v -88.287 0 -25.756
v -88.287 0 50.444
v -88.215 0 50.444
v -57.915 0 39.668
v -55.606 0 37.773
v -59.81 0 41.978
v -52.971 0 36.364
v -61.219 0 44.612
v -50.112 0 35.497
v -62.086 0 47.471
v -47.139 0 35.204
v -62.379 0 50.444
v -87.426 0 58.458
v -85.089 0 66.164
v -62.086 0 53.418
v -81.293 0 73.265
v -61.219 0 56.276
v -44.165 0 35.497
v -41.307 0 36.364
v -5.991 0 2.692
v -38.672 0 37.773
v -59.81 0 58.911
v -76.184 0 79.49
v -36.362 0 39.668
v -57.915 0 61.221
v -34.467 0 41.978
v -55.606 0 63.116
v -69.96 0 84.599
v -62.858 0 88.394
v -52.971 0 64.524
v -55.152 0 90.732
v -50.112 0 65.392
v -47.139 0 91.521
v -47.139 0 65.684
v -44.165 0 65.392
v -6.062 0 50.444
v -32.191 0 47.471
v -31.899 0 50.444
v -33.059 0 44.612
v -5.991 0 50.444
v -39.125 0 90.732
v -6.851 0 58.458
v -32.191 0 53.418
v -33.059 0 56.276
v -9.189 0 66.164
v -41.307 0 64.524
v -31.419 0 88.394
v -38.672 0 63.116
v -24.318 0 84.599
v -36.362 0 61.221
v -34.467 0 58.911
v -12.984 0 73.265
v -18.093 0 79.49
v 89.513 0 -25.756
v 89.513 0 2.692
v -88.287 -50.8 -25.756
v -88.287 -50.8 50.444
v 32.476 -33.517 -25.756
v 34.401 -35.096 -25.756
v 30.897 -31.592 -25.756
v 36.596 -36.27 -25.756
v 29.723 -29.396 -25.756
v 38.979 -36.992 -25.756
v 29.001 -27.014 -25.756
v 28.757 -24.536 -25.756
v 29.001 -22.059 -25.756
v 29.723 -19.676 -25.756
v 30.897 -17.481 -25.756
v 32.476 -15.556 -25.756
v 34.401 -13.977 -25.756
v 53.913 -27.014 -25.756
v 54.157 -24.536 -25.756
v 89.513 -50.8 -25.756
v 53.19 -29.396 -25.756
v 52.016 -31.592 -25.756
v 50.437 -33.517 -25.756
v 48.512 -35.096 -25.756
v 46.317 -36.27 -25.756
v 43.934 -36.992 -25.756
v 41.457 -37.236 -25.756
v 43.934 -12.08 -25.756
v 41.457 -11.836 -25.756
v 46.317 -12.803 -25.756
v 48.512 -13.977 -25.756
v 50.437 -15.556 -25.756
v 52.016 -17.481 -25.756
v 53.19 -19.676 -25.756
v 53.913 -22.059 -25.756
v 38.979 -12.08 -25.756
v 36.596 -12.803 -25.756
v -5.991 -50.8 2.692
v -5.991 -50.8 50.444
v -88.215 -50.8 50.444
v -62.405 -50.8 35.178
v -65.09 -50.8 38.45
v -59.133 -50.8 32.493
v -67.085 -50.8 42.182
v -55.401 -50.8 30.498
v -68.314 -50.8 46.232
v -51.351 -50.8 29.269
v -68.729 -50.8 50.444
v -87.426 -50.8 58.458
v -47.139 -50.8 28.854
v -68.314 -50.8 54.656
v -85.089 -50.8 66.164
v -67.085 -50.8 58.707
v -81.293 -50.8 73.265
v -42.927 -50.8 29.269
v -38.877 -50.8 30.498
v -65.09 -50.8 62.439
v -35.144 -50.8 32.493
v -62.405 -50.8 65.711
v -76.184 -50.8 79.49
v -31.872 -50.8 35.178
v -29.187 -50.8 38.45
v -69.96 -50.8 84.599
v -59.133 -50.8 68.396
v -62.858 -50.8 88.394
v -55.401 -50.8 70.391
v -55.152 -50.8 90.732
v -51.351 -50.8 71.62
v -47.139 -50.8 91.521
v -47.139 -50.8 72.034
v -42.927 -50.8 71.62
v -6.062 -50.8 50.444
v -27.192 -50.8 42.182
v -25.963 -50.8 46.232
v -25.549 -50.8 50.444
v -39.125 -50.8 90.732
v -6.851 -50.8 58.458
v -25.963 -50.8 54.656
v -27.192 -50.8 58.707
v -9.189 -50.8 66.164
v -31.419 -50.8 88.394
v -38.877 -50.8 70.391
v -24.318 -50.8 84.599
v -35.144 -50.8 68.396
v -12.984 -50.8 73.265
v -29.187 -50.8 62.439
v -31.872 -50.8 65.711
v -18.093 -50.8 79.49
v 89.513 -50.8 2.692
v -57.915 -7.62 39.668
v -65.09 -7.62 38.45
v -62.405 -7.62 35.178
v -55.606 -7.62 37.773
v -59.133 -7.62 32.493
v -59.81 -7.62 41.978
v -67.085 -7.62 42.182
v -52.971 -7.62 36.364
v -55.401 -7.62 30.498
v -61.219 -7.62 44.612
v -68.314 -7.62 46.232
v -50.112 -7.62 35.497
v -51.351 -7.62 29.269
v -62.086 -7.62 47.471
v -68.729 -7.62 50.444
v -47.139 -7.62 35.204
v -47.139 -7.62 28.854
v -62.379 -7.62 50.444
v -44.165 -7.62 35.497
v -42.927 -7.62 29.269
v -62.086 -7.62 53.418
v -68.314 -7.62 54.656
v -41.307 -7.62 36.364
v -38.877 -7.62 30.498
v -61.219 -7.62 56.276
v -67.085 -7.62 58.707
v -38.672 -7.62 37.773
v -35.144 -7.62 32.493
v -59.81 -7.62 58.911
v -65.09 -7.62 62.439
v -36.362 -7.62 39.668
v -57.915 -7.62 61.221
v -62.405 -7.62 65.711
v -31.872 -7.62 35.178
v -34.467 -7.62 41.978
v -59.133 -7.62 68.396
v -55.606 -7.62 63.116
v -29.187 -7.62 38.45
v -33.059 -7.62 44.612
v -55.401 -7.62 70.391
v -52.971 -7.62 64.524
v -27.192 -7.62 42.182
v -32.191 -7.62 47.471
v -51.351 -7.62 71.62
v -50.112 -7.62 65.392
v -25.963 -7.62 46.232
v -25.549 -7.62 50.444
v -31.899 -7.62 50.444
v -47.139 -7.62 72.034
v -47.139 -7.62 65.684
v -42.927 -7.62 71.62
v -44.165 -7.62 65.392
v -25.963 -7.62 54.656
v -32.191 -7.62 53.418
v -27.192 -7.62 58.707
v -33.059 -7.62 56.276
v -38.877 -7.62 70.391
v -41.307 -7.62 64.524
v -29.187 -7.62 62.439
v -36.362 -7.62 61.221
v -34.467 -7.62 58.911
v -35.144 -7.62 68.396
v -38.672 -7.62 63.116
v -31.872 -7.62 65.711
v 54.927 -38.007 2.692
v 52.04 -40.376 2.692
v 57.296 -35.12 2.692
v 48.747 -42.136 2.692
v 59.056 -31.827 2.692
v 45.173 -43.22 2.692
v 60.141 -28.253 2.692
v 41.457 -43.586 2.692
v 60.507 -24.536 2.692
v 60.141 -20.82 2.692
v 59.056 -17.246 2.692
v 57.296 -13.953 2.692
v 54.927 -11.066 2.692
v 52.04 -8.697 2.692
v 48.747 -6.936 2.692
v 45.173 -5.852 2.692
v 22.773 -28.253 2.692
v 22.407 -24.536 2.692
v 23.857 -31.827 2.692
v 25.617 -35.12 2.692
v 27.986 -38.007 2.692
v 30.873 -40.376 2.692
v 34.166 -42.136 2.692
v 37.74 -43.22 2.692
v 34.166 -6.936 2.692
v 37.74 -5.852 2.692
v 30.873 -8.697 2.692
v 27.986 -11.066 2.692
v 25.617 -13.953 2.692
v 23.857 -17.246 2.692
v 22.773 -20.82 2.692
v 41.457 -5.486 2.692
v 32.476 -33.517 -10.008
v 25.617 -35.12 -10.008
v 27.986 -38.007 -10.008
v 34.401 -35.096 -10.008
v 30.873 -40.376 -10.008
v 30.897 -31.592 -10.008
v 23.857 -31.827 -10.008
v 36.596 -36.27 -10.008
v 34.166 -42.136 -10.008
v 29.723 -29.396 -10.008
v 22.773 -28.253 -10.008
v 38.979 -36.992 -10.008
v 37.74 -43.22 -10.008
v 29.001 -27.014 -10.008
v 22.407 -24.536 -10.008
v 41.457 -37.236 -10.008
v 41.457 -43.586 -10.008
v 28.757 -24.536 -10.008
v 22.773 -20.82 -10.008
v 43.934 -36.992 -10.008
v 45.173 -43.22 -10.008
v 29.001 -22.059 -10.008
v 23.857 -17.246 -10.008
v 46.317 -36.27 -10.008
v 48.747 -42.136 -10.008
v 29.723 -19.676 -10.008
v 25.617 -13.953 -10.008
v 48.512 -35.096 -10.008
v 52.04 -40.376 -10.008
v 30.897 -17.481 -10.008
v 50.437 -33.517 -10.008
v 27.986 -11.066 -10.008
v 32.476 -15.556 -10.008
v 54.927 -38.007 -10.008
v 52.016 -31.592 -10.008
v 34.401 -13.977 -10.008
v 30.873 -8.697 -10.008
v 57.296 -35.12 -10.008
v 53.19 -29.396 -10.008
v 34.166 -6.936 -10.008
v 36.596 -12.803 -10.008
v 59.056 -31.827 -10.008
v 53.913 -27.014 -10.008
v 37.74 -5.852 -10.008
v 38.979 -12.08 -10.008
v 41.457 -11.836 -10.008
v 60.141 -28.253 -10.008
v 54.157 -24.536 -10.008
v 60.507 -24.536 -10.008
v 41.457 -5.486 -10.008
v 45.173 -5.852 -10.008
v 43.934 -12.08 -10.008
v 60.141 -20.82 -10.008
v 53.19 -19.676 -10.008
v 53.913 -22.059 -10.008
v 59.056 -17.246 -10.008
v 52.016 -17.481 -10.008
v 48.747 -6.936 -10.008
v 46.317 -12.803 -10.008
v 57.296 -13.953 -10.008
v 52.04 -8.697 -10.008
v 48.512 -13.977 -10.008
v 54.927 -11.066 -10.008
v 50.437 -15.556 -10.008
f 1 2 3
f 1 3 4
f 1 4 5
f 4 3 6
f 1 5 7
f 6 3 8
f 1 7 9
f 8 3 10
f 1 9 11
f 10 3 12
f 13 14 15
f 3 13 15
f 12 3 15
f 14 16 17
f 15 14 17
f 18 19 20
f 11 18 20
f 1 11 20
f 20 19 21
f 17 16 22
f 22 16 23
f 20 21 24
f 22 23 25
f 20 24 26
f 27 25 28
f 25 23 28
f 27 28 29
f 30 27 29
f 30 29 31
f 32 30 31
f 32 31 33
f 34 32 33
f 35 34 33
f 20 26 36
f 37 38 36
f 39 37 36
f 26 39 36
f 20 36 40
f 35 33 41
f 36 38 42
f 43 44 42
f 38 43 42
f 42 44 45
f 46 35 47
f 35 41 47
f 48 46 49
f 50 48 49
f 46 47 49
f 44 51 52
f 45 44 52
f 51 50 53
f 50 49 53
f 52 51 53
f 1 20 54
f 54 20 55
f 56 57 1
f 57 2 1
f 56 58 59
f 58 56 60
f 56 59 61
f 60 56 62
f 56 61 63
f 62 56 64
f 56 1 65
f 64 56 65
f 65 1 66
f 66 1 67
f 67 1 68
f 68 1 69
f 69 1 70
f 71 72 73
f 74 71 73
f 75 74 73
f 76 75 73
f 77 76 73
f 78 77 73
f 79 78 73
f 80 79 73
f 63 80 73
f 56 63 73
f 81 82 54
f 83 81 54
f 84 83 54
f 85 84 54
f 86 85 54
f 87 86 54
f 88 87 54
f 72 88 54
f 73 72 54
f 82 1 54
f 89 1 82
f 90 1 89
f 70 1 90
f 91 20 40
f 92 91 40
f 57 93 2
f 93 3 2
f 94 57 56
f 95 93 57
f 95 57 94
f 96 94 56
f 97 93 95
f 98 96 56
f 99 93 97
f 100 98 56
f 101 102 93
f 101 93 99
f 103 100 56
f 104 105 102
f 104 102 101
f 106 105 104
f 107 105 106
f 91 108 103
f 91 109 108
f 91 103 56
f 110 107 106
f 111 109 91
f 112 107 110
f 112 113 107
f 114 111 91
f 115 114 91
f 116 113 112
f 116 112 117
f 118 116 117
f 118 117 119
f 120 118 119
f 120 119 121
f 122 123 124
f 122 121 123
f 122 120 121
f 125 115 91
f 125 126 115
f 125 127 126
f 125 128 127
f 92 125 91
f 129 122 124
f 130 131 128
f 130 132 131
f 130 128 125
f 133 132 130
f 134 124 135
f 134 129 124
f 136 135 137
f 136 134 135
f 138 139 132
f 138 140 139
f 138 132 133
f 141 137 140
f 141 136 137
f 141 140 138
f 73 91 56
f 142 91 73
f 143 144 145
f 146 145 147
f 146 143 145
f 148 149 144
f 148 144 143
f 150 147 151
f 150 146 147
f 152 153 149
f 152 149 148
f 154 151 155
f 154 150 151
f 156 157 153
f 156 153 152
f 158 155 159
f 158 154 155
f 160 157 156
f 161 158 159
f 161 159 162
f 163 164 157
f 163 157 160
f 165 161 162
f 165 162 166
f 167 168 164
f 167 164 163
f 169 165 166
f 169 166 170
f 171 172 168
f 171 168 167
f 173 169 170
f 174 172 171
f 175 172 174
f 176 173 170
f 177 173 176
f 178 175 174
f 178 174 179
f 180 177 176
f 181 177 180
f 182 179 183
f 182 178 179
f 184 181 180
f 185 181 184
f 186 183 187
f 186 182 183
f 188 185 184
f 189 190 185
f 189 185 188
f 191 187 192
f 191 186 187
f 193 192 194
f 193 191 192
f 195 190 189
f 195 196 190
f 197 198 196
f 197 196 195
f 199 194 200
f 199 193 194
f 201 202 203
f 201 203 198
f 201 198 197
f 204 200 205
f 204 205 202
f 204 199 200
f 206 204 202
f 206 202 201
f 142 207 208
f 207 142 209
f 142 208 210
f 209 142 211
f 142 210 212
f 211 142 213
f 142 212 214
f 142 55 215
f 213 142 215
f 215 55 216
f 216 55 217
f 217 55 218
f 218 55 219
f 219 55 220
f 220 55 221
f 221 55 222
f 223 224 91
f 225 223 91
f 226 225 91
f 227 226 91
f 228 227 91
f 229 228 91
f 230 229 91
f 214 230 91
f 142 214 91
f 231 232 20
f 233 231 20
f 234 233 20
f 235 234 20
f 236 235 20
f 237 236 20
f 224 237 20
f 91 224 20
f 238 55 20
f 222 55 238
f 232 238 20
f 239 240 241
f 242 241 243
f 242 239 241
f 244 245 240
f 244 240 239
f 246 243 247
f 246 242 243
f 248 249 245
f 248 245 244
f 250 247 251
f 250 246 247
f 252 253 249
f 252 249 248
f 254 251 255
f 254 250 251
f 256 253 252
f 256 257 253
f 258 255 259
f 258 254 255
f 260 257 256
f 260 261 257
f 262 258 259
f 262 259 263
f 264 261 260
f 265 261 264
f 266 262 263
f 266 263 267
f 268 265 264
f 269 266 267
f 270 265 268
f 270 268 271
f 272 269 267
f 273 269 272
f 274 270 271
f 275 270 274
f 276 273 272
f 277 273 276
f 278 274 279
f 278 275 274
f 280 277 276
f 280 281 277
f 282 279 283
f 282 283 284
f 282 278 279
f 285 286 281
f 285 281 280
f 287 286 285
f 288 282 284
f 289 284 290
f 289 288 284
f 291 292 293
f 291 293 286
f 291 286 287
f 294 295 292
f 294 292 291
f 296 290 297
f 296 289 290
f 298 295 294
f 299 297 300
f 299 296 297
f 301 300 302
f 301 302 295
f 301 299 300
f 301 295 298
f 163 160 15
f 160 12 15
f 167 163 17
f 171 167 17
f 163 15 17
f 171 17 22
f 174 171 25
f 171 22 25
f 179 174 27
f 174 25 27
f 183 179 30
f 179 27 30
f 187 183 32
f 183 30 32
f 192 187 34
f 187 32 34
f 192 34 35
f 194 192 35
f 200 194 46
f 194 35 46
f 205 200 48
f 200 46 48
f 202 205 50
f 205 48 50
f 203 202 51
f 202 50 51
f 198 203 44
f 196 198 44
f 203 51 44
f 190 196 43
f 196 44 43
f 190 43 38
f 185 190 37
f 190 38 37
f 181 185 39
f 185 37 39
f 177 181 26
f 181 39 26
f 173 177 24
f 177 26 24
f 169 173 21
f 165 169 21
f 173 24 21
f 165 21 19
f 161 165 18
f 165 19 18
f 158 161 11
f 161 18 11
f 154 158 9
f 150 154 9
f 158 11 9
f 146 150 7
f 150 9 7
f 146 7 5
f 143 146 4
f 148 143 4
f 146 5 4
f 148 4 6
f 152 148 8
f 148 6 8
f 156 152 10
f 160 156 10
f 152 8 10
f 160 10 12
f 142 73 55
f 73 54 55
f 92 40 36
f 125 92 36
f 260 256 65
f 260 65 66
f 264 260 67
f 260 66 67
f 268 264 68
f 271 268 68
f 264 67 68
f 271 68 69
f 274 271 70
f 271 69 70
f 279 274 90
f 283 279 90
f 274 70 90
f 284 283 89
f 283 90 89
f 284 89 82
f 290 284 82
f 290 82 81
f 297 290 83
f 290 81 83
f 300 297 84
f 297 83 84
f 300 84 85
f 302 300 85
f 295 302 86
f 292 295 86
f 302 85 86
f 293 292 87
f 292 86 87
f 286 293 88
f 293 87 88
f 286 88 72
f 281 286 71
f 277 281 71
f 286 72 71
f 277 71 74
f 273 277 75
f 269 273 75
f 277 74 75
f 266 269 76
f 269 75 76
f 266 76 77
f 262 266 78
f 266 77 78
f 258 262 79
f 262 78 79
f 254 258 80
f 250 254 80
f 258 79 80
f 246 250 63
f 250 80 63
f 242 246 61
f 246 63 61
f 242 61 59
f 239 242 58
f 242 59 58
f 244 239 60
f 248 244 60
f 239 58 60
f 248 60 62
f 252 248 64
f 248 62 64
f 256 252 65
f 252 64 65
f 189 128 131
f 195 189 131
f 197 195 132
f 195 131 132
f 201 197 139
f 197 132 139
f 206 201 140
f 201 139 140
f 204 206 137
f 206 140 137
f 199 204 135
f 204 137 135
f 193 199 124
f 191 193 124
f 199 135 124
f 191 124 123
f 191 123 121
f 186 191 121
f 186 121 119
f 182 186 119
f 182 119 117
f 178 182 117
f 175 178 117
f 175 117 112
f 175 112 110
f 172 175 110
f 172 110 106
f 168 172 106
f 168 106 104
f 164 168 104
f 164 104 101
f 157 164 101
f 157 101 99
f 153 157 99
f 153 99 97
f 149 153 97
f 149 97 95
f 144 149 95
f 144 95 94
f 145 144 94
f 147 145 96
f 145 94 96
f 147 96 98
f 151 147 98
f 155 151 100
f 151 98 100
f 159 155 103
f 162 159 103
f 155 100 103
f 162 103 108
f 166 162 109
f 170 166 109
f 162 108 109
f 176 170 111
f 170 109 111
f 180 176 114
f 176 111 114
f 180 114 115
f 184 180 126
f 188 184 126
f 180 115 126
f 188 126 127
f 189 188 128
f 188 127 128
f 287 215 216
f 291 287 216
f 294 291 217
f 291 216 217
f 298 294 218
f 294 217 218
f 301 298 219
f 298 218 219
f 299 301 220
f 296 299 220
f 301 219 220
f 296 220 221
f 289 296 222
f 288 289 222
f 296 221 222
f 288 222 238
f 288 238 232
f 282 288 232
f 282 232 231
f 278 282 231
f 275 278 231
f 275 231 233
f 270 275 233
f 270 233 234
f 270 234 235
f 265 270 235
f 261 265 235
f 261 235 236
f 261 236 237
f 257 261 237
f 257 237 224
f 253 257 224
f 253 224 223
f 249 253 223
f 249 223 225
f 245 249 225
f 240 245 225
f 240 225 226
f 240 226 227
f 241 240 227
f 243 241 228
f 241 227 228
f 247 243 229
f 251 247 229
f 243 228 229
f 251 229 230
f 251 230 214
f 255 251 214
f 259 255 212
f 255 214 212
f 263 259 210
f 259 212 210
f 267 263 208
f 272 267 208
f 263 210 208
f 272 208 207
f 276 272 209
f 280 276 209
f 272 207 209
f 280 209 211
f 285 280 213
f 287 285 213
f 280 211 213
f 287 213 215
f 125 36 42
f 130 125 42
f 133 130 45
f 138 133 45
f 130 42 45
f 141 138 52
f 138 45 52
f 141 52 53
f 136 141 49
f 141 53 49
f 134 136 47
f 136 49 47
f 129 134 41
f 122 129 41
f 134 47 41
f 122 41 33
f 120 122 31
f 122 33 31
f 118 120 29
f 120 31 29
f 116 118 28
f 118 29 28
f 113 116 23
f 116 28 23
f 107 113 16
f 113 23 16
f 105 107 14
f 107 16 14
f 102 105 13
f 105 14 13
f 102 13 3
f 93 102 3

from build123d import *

# Parameters (mm, degrees)
F1_DEPTH       = 25.4
F2_DEPTH       = 25.4
F4_D           = 25.4
F4_CBORE_D     = 38.1
F4_CBORE_DEPTH = 12.7
F5_DEPTH       = 25.4
F6_DEPTH       = 25.4
F8_D           = 30.48
F8_CBORE_D     = 43.18
F8_CBORE_DEPTH = 43.18


with BuildPart() as f1:
    # F0 (on Front) → F1 (new body)
    with BuildSketch(Plane.XZ):
        with BuildLine():
            ThreePointArc((-6.0617997533, 50.4444008589), (-47.1386495735, 91.5212506791), (-88.2154993937, 50.4444008589))
            Line((-88.2154993937, 50.4444008589), (-68.9775327914, 50.4444008589))
            ThreePointArc((-68.9775327914, 50.4444008589), (-47.1386495735, 72.2832840767), (-25.2997663556, 50.4444008589))
            Line((-25.2997663556, 50.4444008589), (-6.0617997533, 50.4444008589))
        make_face()
        with BuildLine():
            Line((-68.9775327914, 50.4444008589), (-88.2154993937, 50.4444008589))
            ThreePointArc((-88.2154993937, 50.4444008589), (-47.1386495735, 9.3675510387), (-6.0617997533, 50.4444008589))
            Line((-6.0617997533, 50.4444008589), (-25.2997663556, 50.4444008589))
            ThreePointArc((-25.2997663556, 50.4444008589), (-47.1386495735, 28.605517641), (-68.9775327914, 50.4444008589))
        make_face()
        with BuildLine():
            Line((-88.2866495735, 50.4444008589), (-88.2866495735, -25.7555991411))
            Line((-88.2866495735, -25.7555991411), (89.5133504265, -25.7555991411))
            Line((89.5133504265, -25.7555991411), (89.5133504265, 2.6924008589))
            Line((89.5133504265, 2.6924008589), (-5.9906495735, 2.6924008589))
            Line((-5.9906495735, 2.6924008589), (-5.9906495735, 50.4444008589))
            Line((-5.9906495735, 50.4444008589), (-6.0617997533, 50.4444008589))
            ThreePointArc((-6.0617997533, 50.4444008589), (-47.1386495735, 9.3675510387), (-88.2154993937, 50.4444008589))
            Line((-88.2154993937, 50.4444008589), (-88.2866495735, 50.4444008589))
        make_face()
    extrude(amount=F1_DEPTH)

    # F2 (add): a face of the model
    f2_faces = [f1.faces().sort_by_distance(p)[0] for p in [
        (-23.3187363133, -25.4, 14.8327425436),
    ]]
    extrude(f2_faces, amount=F2_DEPTH)

    # F4 (through all)
    with Locations(Plane.XY.offset(2.6924008589)):
        with Locations((41.4565503597, -24.5364010334)):
            CounterBoreHole(F4_D / 2, F4_CBORE_D / 2, F4_CBORE_DEPTH)

    # F0 (on Front) → F5 (join)
    with BuildSketch(Plane.XZ):
        with BuildLine():
            Line((-47.1386495735, 50.4444008589), (-68.9775327914, 50.4444008589))
            ThreePointArc((-68.9775327914, 50.4444008589), (-47.1386495735, 28.605517641), (-25.2997663556, 50.4444008589))
            Line((-25.2997663556, 50.4444008589), (-47.1386495735, 50.4444008589))
        make_face()
        with BuildLine():
            ThreePointArc((-25.2997663556, 50.4444008589), (-47.1386495735, 72.2832840767), (-68.9775327914, 50.4444008589))
            Line((-68.9775327914, 50.4444008589), (-47.1386495735, 50.4444008589))
            Line((-47.1386495735, 50.4444008589), (-25.2997663556, 50.4444008589))
        make_face()
    extrude(amount=F5_DEPTH)

    # F6 (add): a face of the model
    f6_faces = [f1.faces().sort_by_distance(p)[0] for p in [
        (-47.1386495735, -25.4, 50.4444008589),
    ]]
    extrude(f6_faces, amount=F6_DEPTH)

    # F8 (through all)
    with Locations(Plane.XZ.offset(50.8)):
        with Locations((-47.1386495735, 50.4444008589)):
            CounterBoreHole(F8_D / 2, F8_CBORE_D / 2, F8_CBORE_DEPTH)


solid = f1.part
